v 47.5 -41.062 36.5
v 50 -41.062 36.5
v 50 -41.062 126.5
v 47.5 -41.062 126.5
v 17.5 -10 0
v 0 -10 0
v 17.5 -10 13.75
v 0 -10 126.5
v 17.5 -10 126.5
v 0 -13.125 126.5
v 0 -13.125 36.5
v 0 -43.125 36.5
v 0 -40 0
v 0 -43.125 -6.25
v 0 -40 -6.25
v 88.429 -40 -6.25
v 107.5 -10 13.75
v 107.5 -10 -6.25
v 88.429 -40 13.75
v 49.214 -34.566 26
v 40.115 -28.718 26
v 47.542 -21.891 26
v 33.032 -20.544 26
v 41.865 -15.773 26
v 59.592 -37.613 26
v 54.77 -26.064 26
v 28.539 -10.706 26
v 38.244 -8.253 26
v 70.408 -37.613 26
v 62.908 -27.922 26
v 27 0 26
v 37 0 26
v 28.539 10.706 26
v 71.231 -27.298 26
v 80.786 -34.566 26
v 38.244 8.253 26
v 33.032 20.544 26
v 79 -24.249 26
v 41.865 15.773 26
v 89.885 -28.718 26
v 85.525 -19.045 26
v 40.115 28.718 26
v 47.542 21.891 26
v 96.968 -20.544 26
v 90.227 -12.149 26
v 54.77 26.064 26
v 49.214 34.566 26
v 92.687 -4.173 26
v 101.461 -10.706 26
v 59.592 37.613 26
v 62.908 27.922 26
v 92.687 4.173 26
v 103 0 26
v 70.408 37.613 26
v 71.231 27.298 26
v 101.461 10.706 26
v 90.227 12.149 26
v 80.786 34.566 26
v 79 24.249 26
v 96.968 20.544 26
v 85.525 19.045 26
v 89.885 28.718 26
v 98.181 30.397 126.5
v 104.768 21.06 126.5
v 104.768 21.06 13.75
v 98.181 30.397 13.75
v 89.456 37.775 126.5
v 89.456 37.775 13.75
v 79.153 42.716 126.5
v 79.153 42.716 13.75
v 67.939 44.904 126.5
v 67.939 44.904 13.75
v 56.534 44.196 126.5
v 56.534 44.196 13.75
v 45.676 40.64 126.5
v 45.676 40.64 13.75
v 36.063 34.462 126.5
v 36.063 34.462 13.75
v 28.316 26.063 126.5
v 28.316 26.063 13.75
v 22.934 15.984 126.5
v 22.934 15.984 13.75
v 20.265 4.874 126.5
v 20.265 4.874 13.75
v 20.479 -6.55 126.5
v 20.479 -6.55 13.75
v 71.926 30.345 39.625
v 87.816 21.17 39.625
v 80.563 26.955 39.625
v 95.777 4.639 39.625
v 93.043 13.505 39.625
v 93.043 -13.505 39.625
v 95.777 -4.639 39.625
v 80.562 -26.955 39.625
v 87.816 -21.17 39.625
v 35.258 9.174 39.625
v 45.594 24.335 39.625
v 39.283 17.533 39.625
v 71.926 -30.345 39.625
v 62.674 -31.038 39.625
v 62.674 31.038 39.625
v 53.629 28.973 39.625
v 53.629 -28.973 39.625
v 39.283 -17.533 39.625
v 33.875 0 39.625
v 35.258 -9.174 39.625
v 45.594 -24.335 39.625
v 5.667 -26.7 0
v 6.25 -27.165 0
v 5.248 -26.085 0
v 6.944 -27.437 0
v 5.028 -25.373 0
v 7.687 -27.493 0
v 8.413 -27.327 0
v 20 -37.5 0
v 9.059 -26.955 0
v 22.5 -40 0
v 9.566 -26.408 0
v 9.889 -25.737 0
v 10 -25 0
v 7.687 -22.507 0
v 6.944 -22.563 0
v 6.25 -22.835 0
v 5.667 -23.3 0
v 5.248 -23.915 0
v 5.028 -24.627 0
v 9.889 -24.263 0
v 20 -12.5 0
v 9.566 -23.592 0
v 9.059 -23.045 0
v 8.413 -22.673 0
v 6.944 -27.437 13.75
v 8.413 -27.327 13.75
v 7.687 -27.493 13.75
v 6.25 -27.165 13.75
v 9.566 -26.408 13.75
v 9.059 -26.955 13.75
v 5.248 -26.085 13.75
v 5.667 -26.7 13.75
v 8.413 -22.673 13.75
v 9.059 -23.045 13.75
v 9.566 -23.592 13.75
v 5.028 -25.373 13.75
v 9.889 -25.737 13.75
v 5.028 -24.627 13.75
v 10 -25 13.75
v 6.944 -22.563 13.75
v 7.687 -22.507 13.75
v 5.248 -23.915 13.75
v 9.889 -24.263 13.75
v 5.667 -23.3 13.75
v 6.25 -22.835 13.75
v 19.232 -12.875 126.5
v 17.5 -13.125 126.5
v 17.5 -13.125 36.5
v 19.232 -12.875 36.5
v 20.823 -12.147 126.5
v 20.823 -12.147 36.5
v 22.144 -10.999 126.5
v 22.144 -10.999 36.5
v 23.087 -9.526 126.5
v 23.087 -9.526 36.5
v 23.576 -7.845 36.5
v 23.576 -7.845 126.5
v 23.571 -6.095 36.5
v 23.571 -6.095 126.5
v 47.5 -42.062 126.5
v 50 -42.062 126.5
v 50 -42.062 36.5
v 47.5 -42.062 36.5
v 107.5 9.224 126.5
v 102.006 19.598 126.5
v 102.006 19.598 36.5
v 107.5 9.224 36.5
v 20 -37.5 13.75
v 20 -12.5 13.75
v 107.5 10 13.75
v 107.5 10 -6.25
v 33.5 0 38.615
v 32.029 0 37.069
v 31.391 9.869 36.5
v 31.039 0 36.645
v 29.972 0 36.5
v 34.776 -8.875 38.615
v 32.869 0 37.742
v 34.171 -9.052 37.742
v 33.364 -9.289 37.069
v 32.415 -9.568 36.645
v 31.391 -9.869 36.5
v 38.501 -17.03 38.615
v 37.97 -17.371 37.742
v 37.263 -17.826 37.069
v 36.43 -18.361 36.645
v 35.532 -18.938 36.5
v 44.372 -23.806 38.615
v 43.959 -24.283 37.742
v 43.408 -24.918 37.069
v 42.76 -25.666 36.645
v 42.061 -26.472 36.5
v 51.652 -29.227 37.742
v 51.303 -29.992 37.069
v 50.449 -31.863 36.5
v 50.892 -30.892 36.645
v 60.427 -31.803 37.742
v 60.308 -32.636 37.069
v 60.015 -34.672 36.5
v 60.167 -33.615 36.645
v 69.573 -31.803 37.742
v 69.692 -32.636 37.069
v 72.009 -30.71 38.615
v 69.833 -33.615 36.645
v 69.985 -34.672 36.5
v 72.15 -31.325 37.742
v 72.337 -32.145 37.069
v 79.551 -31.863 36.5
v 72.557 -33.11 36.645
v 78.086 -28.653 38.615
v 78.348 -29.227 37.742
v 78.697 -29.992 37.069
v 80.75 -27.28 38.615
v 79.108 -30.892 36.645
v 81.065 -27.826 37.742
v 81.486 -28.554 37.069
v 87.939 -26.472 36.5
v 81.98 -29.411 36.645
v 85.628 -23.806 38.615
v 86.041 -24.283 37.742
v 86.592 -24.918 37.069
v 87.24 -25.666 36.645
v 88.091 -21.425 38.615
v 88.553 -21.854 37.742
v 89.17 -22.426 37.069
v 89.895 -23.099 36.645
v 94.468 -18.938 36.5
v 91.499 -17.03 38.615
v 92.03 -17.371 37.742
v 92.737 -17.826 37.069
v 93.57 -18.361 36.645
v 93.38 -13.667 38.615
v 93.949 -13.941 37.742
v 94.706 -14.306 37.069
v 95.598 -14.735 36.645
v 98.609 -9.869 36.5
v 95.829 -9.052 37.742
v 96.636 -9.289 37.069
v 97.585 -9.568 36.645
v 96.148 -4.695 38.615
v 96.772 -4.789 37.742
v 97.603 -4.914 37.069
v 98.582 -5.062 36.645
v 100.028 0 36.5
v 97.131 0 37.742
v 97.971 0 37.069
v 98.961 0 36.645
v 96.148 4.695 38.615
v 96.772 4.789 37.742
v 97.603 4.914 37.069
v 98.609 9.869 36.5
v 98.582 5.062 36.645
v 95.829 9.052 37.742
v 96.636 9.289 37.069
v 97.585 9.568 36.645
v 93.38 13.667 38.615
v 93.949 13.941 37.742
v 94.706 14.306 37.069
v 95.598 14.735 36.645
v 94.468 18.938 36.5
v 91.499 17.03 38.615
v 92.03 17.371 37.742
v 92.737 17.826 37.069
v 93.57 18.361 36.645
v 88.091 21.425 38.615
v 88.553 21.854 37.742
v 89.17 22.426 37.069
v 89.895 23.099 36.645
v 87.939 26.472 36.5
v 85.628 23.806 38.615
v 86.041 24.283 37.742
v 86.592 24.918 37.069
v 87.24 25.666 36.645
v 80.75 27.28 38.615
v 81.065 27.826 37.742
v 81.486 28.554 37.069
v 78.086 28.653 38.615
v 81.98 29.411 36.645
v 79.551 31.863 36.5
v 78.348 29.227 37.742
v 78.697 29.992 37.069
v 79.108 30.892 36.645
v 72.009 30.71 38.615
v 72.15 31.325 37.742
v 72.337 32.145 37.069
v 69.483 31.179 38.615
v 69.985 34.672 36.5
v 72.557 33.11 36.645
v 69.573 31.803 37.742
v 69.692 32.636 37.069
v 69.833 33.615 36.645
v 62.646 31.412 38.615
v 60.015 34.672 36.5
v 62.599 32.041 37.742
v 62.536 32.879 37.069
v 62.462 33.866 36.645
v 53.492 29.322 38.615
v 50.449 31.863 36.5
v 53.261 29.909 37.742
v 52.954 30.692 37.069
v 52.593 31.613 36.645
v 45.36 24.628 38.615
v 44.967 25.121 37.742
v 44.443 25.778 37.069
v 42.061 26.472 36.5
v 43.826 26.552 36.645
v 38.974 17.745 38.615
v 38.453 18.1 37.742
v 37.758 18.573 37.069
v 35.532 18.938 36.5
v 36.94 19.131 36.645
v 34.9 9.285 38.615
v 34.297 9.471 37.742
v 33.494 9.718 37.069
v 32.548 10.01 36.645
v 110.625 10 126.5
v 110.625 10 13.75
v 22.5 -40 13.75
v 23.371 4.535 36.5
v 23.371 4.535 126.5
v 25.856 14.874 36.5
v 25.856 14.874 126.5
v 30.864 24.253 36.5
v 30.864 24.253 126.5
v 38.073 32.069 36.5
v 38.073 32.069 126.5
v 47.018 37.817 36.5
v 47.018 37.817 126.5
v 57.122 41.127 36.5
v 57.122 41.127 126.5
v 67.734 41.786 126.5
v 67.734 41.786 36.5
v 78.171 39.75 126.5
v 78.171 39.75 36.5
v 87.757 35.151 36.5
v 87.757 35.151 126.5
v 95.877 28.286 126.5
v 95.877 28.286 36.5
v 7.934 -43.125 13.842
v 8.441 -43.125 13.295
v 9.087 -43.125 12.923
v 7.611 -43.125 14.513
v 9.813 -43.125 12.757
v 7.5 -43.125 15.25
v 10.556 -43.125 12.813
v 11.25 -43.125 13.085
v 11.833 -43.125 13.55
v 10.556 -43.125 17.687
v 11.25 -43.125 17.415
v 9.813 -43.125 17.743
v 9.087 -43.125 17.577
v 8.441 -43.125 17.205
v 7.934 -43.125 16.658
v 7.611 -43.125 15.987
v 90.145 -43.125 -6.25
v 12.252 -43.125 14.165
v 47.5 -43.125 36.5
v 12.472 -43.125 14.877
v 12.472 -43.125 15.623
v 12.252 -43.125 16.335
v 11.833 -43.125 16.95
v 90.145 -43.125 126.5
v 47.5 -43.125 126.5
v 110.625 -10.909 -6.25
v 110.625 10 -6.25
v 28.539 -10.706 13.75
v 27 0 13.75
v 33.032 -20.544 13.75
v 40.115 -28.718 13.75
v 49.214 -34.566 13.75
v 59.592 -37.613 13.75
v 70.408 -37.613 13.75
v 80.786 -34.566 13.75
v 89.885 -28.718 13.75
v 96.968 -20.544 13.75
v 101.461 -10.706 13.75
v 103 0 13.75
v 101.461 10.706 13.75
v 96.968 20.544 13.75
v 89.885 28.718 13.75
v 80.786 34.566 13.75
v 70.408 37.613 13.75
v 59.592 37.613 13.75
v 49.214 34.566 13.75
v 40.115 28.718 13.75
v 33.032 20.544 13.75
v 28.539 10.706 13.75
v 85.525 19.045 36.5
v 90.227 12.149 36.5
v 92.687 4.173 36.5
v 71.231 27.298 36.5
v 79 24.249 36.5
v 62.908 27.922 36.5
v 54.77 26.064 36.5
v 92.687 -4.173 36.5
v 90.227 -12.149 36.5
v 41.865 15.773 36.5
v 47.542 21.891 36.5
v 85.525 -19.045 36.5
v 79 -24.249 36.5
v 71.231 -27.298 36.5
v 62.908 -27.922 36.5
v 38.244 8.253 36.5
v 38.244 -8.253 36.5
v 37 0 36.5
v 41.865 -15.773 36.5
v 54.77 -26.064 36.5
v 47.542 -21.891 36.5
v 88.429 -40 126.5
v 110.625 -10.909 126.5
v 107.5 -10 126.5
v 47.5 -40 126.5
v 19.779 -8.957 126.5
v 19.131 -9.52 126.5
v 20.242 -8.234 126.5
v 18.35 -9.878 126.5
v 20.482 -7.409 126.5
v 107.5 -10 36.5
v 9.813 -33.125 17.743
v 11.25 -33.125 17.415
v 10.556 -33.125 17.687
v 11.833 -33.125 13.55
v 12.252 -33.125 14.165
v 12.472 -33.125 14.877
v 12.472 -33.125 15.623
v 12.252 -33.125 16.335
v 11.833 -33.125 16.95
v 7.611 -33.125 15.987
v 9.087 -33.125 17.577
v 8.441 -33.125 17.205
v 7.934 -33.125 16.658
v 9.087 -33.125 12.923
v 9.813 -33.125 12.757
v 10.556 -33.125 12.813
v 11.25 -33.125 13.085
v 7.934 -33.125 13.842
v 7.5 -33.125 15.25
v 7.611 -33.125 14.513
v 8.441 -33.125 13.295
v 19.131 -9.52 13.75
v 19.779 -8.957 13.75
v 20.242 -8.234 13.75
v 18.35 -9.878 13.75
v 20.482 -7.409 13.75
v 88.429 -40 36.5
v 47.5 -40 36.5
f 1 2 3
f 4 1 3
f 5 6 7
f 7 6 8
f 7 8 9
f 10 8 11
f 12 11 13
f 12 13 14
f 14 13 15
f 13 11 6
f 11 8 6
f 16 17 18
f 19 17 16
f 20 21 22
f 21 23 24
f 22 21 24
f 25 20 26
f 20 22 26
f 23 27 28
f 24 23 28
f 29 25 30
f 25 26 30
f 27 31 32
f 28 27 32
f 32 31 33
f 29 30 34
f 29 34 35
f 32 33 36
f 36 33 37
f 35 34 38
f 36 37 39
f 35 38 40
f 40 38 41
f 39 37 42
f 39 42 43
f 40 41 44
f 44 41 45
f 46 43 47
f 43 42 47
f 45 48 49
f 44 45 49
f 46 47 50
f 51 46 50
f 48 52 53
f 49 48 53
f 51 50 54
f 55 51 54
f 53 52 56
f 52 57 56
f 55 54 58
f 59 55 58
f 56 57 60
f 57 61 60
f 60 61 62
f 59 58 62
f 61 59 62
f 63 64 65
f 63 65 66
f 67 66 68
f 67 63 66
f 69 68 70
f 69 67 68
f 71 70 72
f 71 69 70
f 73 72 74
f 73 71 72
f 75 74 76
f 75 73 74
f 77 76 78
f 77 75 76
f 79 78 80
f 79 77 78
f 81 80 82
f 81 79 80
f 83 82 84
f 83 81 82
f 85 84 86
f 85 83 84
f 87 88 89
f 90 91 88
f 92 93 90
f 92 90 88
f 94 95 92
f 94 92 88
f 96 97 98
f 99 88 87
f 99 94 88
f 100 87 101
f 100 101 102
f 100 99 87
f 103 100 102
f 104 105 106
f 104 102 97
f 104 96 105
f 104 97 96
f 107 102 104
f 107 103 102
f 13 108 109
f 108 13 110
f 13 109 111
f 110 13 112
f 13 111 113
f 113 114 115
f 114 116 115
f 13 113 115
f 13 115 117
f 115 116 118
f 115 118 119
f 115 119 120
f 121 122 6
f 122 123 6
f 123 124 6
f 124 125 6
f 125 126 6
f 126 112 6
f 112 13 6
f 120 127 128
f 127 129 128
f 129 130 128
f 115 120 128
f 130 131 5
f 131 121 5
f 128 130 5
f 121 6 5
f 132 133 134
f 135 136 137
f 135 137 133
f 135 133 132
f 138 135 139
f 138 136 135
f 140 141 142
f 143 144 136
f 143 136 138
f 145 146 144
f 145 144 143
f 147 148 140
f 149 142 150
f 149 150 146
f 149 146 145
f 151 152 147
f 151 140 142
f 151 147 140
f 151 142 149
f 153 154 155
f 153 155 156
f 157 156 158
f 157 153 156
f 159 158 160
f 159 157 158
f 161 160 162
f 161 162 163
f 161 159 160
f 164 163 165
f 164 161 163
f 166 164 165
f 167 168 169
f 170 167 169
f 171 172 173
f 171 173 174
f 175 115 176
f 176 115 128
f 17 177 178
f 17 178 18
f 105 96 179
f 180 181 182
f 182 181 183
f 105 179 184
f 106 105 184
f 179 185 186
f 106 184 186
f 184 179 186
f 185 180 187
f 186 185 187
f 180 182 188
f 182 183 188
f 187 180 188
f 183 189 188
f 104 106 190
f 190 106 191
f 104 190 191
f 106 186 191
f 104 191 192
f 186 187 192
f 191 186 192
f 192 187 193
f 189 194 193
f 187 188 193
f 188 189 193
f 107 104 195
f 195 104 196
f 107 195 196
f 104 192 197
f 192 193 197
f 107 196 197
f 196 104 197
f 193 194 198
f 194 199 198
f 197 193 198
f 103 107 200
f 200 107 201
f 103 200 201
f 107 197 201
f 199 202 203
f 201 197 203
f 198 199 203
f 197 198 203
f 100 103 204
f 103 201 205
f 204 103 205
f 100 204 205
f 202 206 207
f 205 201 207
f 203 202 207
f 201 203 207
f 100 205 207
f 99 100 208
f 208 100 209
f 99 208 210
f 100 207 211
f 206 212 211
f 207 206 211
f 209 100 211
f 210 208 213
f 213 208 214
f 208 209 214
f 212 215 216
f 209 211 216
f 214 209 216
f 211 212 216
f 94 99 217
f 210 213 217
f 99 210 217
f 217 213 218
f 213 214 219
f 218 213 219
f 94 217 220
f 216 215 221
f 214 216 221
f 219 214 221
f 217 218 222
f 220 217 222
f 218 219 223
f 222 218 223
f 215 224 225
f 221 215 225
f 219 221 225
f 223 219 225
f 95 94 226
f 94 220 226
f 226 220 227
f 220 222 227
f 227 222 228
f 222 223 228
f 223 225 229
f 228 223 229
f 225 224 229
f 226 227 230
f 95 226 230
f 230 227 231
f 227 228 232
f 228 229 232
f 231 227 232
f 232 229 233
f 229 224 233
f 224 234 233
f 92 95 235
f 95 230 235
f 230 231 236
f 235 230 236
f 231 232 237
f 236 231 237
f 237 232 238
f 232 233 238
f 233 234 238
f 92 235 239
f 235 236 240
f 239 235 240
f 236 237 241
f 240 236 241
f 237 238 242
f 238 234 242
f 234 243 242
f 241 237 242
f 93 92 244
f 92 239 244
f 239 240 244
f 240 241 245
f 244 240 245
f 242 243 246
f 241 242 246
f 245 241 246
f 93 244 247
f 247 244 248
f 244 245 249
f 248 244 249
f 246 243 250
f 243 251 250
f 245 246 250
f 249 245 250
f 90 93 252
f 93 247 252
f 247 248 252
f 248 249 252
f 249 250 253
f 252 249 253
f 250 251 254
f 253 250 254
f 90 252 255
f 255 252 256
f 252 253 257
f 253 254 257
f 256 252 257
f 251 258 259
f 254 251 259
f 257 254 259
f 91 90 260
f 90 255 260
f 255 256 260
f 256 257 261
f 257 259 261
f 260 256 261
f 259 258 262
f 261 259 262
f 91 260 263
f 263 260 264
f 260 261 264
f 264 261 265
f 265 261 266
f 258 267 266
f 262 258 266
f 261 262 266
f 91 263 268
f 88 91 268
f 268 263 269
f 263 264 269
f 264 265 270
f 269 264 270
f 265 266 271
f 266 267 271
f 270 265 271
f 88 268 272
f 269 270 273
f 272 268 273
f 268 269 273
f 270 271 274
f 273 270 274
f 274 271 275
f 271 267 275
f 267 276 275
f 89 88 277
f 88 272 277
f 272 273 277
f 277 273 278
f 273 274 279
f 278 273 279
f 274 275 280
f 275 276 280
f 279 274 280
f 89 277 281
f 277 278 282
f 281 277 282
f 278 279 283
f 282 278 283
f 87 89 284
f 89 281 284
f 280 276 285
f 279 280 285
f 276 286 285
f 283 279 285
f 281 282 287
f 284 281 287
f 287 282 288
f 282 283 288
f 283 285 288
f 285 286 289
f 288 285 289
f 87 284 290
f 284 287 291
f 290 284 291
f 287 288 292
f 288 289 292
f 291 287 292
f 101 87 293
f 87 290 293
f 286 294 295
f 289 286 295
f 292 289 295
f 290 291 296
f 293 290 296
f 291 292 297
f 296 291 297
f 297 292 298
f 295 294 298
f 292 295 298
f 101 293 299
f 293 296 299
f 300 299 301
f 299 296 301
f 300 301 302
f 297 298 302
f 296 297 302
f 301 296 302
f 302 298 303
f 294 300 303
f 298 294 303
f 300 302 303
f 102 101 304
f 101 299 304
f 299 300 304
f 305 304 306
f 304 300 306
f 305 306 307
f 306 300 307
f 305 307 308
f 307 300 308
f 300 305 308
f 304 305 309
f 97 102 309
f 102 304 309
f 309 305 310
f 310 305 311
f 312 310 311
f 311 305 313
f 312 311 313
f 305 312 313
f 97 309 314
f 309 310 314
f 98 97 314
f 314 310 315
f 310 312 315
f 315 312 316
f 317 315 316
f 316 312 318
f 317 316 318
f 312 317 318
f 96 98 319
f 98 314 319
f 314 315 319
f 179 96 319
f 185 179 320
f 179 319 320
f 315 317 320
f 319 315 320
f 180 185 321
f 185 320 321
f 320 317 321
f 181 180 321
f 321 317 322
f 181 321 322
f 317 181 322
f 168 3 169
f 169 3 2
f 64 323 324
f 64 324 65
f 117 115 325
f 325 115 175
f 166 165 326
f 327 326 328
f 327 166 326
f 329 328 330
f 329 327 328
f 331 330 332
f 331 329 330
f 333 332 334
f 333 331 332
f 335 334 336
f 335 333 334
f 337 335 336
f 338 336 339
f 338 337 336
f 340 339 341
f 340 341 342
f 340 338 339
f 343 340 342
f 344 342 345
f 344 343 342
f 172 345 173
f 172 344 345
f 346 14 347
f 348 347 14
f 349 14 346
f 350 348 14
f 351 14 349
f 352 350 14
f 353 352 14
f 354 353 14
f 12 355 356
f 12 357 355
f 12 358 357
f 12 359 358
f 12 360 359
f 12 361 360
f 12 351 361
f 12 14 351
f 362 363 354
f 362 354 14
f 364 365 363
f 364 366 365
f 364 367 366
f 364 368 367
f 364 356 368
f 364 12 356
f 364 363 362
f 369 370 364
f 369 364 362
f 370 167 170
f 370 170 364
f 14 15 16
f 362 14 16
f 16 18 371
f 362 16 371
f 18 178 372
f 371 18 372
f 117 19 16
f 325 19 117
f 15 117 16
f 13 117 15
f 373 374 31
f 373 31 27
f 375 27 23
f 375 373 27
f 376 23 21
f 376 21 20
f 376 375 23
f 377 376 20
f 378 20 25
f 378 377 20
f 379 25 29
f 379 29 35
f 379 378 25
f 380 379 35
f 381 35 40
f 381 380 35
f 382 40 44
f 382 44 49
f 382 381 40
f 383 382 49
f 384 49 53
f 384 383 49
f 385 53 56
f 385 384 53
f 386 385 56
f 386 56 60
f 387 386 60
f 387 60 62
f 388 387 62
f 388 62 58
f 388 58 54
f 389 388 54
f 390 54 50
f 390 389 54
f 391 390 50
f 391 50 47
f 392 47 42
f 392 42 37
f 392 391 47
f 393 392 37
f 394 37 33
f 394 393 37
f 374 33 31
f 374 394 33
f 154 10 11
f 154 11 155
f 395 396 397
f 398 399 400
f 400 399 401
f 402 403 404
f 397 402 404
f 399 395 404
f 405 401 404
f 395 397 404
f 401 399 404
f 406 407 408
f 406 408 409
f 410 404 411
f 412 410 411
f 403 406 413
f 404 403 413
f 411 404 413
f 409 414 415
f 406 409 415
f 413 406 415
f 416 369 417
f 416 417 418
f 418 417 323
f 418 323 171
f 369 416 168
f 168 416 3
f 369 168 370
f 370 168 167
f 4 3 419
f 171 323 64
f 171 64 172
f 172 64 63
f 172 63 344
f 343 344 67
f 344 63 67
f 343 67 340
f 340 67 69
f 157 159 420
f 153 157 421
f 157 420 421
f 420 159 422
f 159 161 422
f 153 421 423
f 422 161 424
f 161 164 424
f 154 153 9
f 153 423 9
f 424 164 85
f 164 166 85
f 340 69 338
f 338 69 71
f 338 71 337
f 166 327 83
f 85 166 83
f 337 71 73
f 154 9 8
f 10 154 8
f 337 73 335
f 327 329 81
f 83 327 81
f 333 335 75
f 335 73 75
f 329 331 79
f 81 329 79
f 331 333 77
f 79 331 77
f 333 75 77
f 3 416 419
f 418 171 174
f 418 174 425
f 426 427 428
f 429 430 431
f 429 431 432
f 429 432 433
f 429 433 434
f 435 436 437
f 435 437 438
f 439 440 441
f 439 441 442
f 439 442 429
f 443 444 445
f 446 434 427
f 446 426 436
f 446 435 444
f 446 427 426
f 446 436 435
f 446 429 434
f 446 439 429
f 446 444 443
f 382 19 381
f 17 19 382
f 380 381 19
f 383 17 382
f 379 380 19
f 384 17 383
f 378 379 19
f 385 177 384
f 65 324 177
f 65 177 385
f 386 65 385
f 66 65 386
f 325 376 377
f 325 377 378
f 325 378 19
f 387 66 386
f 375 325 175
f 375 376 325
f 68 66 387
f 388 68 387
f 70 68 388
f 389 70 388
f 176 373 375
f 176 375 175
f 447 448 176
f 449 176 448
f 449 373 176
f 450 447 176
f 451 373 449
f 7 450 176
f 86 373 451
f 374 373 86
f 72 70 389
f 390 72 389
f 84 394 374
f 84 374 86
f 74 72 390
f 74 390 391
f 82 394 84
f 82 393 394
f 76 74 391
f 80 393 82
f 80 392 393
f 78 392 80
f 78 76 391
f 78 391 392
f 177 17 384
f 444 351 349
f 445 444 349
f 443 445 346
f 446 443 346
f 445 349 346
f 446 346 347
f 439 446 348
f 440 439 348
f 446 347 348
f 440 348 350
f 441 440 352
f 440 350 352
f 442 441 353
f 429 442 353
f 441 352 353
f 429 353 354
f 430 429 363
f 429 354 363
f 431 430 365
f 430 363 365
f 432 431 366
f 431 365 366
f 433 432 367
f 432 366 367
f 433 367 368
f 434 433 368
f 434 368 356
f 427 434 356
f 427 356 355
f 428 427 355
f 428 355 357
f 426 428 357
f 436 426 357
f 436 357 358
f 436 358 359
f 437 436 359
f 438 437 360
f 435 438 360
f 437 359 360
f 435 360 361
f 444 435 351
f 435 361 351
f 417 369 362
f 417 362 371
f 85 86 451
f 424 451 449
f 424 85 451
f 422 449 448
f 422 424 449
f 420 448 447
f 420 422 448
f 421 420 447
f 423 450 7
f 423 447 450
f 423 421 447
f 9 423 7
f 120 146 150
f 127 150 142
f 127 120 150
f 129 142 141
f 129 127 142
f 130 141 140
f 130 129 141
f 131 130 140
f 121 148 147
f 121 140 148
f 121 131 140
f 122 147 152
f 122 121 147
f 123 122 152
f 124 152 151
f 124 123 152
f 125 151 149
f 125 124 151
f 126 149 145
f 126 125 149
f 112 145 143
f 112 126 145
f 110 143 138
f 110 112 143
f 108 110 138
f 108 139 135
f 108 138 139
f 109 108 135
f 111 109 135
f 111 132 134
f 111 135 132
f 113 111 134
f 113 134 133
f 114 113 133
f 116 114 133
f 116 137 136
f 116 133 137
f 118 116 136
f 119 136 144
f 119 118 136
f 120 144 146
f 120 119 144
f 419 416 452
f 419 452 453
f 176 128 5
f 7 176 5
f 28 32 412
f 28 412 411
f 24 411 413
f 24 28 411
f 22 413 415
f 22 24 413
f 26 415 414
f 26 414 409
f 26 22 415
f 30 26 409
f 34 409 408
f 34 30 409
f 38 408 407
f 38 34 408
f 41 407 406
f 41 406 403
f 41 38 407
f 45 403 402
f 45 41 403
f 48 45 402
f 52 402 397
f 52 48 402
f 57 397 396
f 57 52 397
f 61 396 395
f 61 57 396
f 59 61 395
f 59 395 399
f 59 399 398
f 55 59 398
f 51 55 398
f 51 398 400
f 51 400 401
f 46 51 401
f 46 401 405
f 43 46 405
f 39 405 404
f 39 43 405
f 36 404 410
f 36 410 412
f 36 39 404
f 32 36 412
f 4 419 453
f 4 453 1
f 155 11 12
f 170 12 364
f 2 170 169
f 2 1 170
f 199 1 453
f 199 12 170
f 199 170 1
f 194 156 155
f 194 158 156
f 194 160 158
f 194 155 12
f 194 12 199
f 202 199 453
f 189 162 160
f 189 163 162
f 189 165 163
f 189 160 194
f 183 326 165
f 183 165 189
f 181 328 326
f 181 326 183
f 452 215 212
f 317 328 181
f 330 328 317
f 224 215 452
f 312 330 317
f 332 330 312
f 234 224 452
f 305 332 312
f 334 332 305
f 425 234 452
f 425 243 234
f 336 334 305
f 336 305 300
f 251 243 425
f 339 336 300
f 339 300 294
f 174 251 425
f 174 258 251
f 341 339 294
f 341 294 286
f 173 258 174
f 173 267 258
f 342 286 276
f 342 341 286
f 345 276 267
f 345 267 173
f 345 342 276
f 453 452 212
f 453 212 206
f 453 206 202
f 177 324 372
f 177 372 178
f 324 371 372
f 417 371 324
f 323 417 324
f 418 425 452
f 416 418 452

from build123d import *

# Parameters (mm, degrees)
SKETCH3_W                = 40
SKETCH3_H                = 30
SKETCH3_R                = 2.5
BOSS_EXTRUDE2_DEPTH      = 6.25
SKETCH4_W                = 40
SKETCH4_H                = 6.25
BOSS_EXTRUDE3_DEPTH      = 7.5
BOSS_EXTRUDE4_DEPTH      = 20
CHAMFER1_SIZE            = 2.5
SKETCH6_R                = 38
BOSS_EXTRUDE5_DEPTH      = 12.25
SKETCH8_R                = 28
BOSS_EXTRUDE7_DEPTH      = 10.5
SKETCH9_R                = 31.125
BOSS_EXTRUDE8_DEPTH      = 3.125
FILLET1_R                = 4
BOSS_EXTRUDE9_DEPTH      = 90
CHAMFER1_OF_MIRROR1_SIZE = 2.5
FILLET1_OF_MIRROR1_R     = 4
SKETCH12_R               = 2.5
BOSS_EXTRUDE10_DEPTH     = 30
SKETCH14_R               = 2.5
CUT_EXTRUDE1_DEPTH       = 10
CUT_EXTRUDE2_DEPTH       = 50
SKETCH17_W               = 1
SKETCH17_H               = 6.235194638
BOSS_EXTRUDE11_DEPTH     = 5
FILLET2_R                = 0.5
FILLET3_R                = 0.5
SKETCH18_W               = 524.380672346
SKETCH18_H               = 94.959875778
CUT_EXTRUDE3_DEPTH       = 174
SKETCH19_W               = 272.949766815
SKETCH19_H               = 179.225609408
CUT_EXTRUDE4_DEPTH       = 174


with BuildPart() as part:
    # Sketch3 → Boss-Extrude2 (new body)
    with BuildSketch(Plane.XY):
        with Locations((0, -25)):
            Rectangle(SKETCH3_W, SKETCH3_H)
        with Locations((7.5, -25)):
            Circle(SKETCH3_R, mode=Mode.SUBTRACT)
        with Locations((-7.5, -25)):
            Circle(SKETCH3_R, mode=Mode.SUBTRACT)
    boss_extrude2 = extrude(amount=BOSS_EXTRUDE2_DEPTH)

    # Sketch4 → Boss-Extrude3 (add)
    with BuildSketch(Plane.XY.offset(6.25)):
        with Locations((0, -36.875)):
            Rectangle(SKETCH4_W, SKETCH4_H)
    boss_extrude3 = extrude(amount=BOSS_EXTRUDE3_DEPTH)

    # Sketch5 → Boss-Extrude4 (add)
    with BuildSketch(Plane.XY.offset(13.75)):
        Polygon((-20, -40), (-88.428700673, -40), (-107.5, -10), (-107.5, 10), (-110.625, 10), (-110.625, -10.909213368), (-90.145103003, -43.125), (90.145103003, -43.125), (110.625, -10.909213368), (110.625, 10), (107.5, 10), (107.5, -10), (88.428700673, -40), (20, -40), align=None)
    boss_extrude4 = extrude(amount=-BOSS_EXTRUDE4_DEPTH)

    # Chamfer1
    chamfer1_edges = [part.edges().sort_by_distance(p)[0] for p in [
        (-20, -40, 6.875),
        (-20, -10, 3.125),
        (20, -10, 3.125),
        (20, -40, 6.875),
    ]]
    chamfer(chamfer1_edges, length=CHAMFER1_SIZE)

    # Sketch6 → Boss-Extrude5 (add)
    with BuildSketch(Plane.XY.offset(13.75)):
        with BuildLine():
            Line((-110.625, 10), (-104.767593775, 21.060353399))
            ThreePointArc((-104.767593775, 21.060353399), (-50.991609061, 42.764061819), (-20.479289941, -6.550295858))
            ThreePointArc((-20.479289941, -6.550295858), (-19.779069285, -8.956923473), (-17.5, -10))
            Line((-17.5, -10), (17.5, -10))
            ThreePointArc((17.5, -10), (19.779069285, -8.956923473), (20.479289941, -6.550295858))
            ThreePointArc((20.479289941, -6.550295858), (50.991609061, 42.764061819), (104.767593775, 21.060353399))
            Line((104.767593775, 21.060353399), (110.625, 10))
            Line((110.625, 10), (110.625, -10.909213368))
            Line((110.625, -10.909213368), (90.145103003, -43.125))
            Line((90.145103003, -43.125), (-90.145103003, -43.125))
            Line((-90.145103003, -43.125), (-110.625, -10.909213368))
            Line((-110.625, -10.909213368), (-110.625, 10))
        make_face()
        with Locations((-65, 0)):
            Circle(SKETCH6_R, mode=Mode.SUBTRACT)
        with Locations(Location((65, 0, 0), (0, 0, 180))):
            Circle(SKETCH6_R, mode=Mode.SUBTRACT)
    boss_extrude5 = extrude(amount=BOSS_EXTRUDE5_DEPTH)

    # Sketch8 → Boss-Extrude7 (add)
    with BuildSketch(Plane.XY.offset(26)):
        with BuildLine():
            Line((-104.767593775, 21.060353399), (-110.625, 10))
            Line((-110.625, 10), (-110.625, -10.909213368))
            Line((-110.625, -10.909213368), (-90.145103003, -43.125))
            Line((-90.145103003, -43.125), (90.145103003, -43.125))
            Line((90.145103003, -43.125), (110.625, -10.909213368))
            Line((110.625, -10.909213368), (110.625, 10))
            Line((110.625, 10), (104.767593775, 21.060353399))
            ThreePointArc((104.767593775, 21.060353399), (50.991609061, 42.764061819), (20.479289941, -6.550295858))
            ThreePointArc((20.479289941, -6.550295858), (19.779069285, -8.956923473), (17.5, -10))
            Line((17.5, -10), (-17.5, -10))
            ThreePointArc((-17.5, -10), (-19.779069285, -8.956923473), (-20.479289941, -6.550295858))
            ThreePointArc((-20.479289941, -6.550295858), (-50.991609061, 42.764061819), (-104.767593775, 21.060353399))
        make_face()
        with Locations(Location((-65, 0, 0), (0, 0, 180))):
            Circle(SKETCH8_R, mode=Mode.SUBTRACT)
        with Locations(Location((65, 0, 0), (0, 0, 180))):
            Circle(SKETCH8_R, mode=Mode.SUBTRACT)
    boss_extrude7 = extrude(amount=BOSS_EXTRUDE7_DEPTH)

    # Sketch9 → Boss-Extrude8 (add)
    with BuildSketch(Plane.XY.offset(36.5)):
        with Locations(Location((65, 0, 0), (0, 0, 180))):
            Circle(SKETCH9_R)
        with Locations((-65, 0)):
            Circle(SKETCH9_R)
    boss_extrude8 = extrude(amount=BOSS_EXTRUDE8_DEPTH)

    # Fillet1
    # the kernel refuses this fillet: 4 mm, written as the material it adds along each edge
    with BuildSketch(Plane(origin=(-65, 0, 36.5), x_dir=(1, 0, 0), z_dir=(0, -1, 0))) as fillet1_piece_1:
        with BuildLine():
            CenterArc((35.028123749, 4), FILLET1_R, 192.635625093, 77.364374907)
            Line((31.125, 3.125), (31.046937525, 3.1075))
            ThreePointArc((31.046937525, 3.1075), (31.045, 1.5625), (31.045, 0))
            Line((31.045, 0), (31.125, -0.08))
            Line((31.125, -0.08), (35.028123749, -0.08))
            Line((35.028123749, -0.08), (35.028123749, 0))
        make_face()
    revolve(axis=Axis((-65, 0, 36.5), (0, 0, 1)))
    with BuildSketch(Plane(origin=(65, 0, 36.5), x_dir=(-1, 0, 0), z_dir=(0, 1, 0))) as fillet1_piece_2:
        with BuildLine():
            CenterArc((35.028123749, 4), FILLET1_R, 192.635625093, 77.364374907)
            Line((31.125, 3.125), (31.046937525, 3.1075))
            ThreePointArc((31.046937525, 3.1075), (31.045, 1.5625), (31.045, 0))
            Line((31.045, 0), (31.125, -0.08))
            Line((31.125, -0.08), (35.028123749, -0.08))
            Line((35.028123749, -0.08), (35.028123749, 0))
        make_face()
    revolve(axis=Axis((65, 0, 36.5), (0, 0, 1)))

    # Sketch10 → Boss-Extrude9 (add)
    with BuildSketch(Plane.XY.offset(36.5)):
        with BuildLine():
            Line((-104.767593775, 21.060353399), (-110.625, 10))
            Line((-110.625, 10), (-110.625, -10.909213368))
            Line((-110.625, -10.909213368), (-90.145103003, -43.125))
            Line((-90.145103003, -43.125), (-47.5, -43.125))
            Line((-47.5, -43.125), (-47.5, -40))
            Line((-47.5, -40), (-88.428700673, -40))
            Line((-88.428700673, -40), (-107.5, -10))
            Line((-107.5, -10), (-107.5, 9.223599474))
            Line((-107.5, 9.223599474), (-102.005955319, 19.597828858))
            ThreePointArc((-102.005955319, 19.597828858), (-51.964413987, 39.794335304), (-23.571005917, -6.095414201))
            ThreePointArc((-23.571005917, -6.095414201), (-22.144141184, -10.999485568), (-17.5, -13.125))
            Line((-17.5, -13.125), (17.5, -13.125))
            ThreePointArc((17.5, -13.125), (22.144141184, -10.999485568), (23.571005917, -6.095414201))
            ThreePointArc((23.571005917, -6.095414201), (51.964413987, 39.794335304), (102.005955319, 19.597828858))
            Line((102.005955319, 19.597828858), (107.5, 9.223599474))
            Line((107.5, 9.223599474), (107.5, -10))
            Line((107.5, -10), (88.428700673, -40))
            Line((88.428700673, -40), (47.5, -40))
            Line((47.5, -40), (47.5, -43.125))
            Line((47.5, -43.125), (90.145103003, -43.125))
            Line((90.145103003, -43.125), (110.625, -10.909213368))
            Line((110.625, -10.909213368), (110.625, 10))
            Line((110.625, 10), (104.767593775, 21.060353399))
            ThreePointArc((104.767593775, 21.060353399), (50.991609061, 42.764061819), (20.479289941, -6.550295858))
            ThreePointArc((20.479289941, -6.550295858), (19.779069285, -8.956923473), (17.5, -10))
            Line((17.5, -10), (-17.5, -10))
            ThreePointArc((-17.5, -10), (-19.779069285, -8.956923473), (-20.479289941, -6.550295858))
            ThreePointArc((-20.479289941, -6.550295858), (-50.991609061, 42.764061819), (-104.767593775, 21.060353399))
        make_face()
    boss_extrude9 = extrude(amount=BOSS_EXTRUDE9_DEPTH)

    # Mirror1: Boss-Extrude2, Boss-Extrude3, Boss-Extrude4, Boss-Extrude5, Boss-Extrude7, Boss-Extrude8, Boss-Extrude9 across plane
    add(boss_extrude2.mirror(Plane(origin=(-65, 0, 126.5), x_dir=(1, 0, 0), z_dir=(0, 0, 1))))
    add(boss_extrude3.mirror(Plane(origin=(-65, 0, 126.5), x_dir=(1, 0, 0), z_dir=(0, 0, 1))))
    add(boss_extrude4.mirror(Plane(origin=(-65, 0, 126.5), x_dir=(1, 0, 0), z_dir=(0, 0, 1))))
    add(boss_extrude5.mirror(Plane(origin=(-65, 0, 126.5), x_dir=(1, 0, 0), z_dir=(0, 0, 1))))
    add(boss_extrude7.mirror(Plane(origin=(-65, 0, 126.5), x_dir=(1, 0, 0), z_dir=(0, 0, 1))))
    add(boss_extrude8.mirror(Plane(origin=(-65, 0, 126.5), x_dir=(1, 0, 0), z_dir=(0, 0, 1))))
    add(boss_extrude9.mirror(Plane(origin=(-65, 0, 126.5), x_dir=(1, 0, 0), z_dir=(0, 0, 1))))

    # Chamfer1 of Mirror1
    chamfer1_of_mirror1_edges = [part.edges().sort_by_distance(p)[0] for p in [
        (-20, -40, 246.125),
        (-20, -10, 249.875),
        (20, -10, 249.875),
        (20, -40, 246.125),
    ]]
    chamfer(chamfer1_of_mirror1_edges, length=CHAMFER1_OF_MIRROR1_SIZE)

    # Fillet1 of Mirror1
    # the kernel refuses this fillet: 4 mm, written as the material it adds along each edge
    with BuildSketch(Plane(origin=(-65, 0, 216.5), x_dir=(1, 0, 0), z_dir=(0, -1, 0))) as fillet1_of_mirror1_piece_1:
        with BuildLine():
            CenterArc((35.028123749, -4), FILLET1_OF_MIRROR1_R, 90, 77.364374907)
            Line((31.125, -3.125), (31.046937525, -3.1075))
            ThreePointArc((31.046937525, -3.1075), (31.045, -1.5625), (31.045, 0))
            Line((31.045, 0), (31.125, 0.08))
            Line((31.125, 0.08), (35.028123749, 0.08))
            Line((35.028123749, 0.08), (35.028123749, 0))
        make_face()
    revolve(axis=Axis((-65, 0, 216.5), (0, 0, 1)))
    with BuildSketch(Plane(origin=(65, 0, 216.5), x_dir=(-1, 0, 0), z_dir=(0, 1, 0))) as fillet1_of_mirror1_piece_2:
        with BuildLine():
            CenterArc((35.028123749, -4), FILLET1_OF_MIRROR1_R, 90, 77.364374907)
            Line((31.125, -3.125), (31.046937525, -3.1075))
            ThreePointArc((31.046937525, -3.1075), (31.045, -1.5625), (31.045, 0))
            Line((31.045, 0), (31.125, 0.08))
            Line((31.125, 0.08), (35.028123749, 0.08))
            Line((35.028123749, 0.08), (35.028123749, 0))
        make_face()
    revolve(axis=Axis((65, 0, 216.5), (0, 0, 1)))

    # Sketch12 → Boss-Extrude10 (add)
    with BuildSketch(Plane.XY.offset(253)):
        Polygon((-20, -12.5), (-20, -37.5), (-22.5, -40), (22.5, -40), (20, -37.5), (20, -12.5), (17.5, -10), (-17.5, -10), align=None)
        with Locations((7.5, -25)):
            Circle(SKETCH12_R, mode=Mode.SUBTRACT)
        with Locations((-7.5, -25)):
            Circle(SKETCH12_R, mode=Mode.SUBTRACT)
    boss_extrude10 = extrude(amount=-BOSS_EXTRUDE10_DEPTH)

    # Mirror2: Boss-Extrude10 across plane
    add(boss_extrude10.mirror(Plane(origin=(0, 0, 126.5), x_dir=(1, 0, 0), z_dir=(0, 0, -1))))

    # Sketch14 → Cut-Extrude1 (cut)
    with BuildSketch(Plane.XZ.offset(43.125)):
        with Locations((10, 237.75)):
            Circle(SKETCH14_R)
        with Locations(Location((-10, 237.75, 0), (0, 0, 180))):
            Circle(SKETCH14_R)
        with Locations((-10, 15.25)):
            Circle(SKETCH14_R)
        with Locations(Location((10, 15.25, 0), (0, 0, 180))):
            Circle(SKETCH14_R)
    extrude(amount=-CUT_EXTRUDE1_DEPTH, mode=Mode.SUBTRACT)

    # Sketch16 → Cut-Extrude2 (cut, symmetric)
    with BuildSketch(Plane(origin=(0, 0, 0), x_dir=(0, 0, -1), z_dir=(1, 0, 0))):
        Polygon((-215.5, -41.0625), (-215.5, -40), (-216.5, -40), (-216.5, -41.0625), (-216.5, -42.0625), (-36.5, -42.0625), (-36.5, -41.0625), align=None)
    cut_extrude2 = extrude(amount=CUT_EXTRUDE2_DEPTH, both=True, mode=Mode.SUBTRACT)

    # Sketch17 → Boss-Extrude11 (add)
    with BuildSketch(Plane(origin=(-47.5, 0, 0), x_dir=(0, 0, -1), z_dir=(1, 0, 0))):
        with Locations((-215, -37.944902681)):
            Rectangle(SKETCH17_W, SKETCH17_H)
    boss_extrude11 = extrude(amount=-BOSS_EXTRUDE11_DEPTH)

    # Fillet2
    fillet2_edges = [part.edges().sort_by_distance(p)[0] for p in [
        (-48.75, -41.0625, 215.5),
        (-50, -40, 214.5),
    ]]
    fillet(fillet2_edges, radius=FILLET2_R)

    # Mirror3: Cut-Extrude2, Boss-Extrude11 across plane
    add(cut_extrude2.mirror(Plane(origin=(0, 0, 0), x_dir=(0, 0, 1), z_dir=(1, 0, 0))), mode=Mode.SUBTRACT)
    add(boss_extrude11.mirror(Plane(origin=(0, 0, 0), x_dir=(0, 0, 1), z_dir=(1, 0, 0))))

    # Fillet3
    fillet3_edges = [part.edges().sort_by_distance(p)[0] for p in [
        (48.75, -41.0625, 215.5),
        (50, -40, 214.5),
    ]]
    fillet(fillet3_edges, radius=FILLET3_R)

    # Sketch18 → Cut-Extrude3 (cut)
    with BuildSketch(Plane(origin=(0, 0, 126.5), x_dir=(-1, 0, 0), z_dir=(0, 0, -1))):
        Rectangle(SKETCH18_W, SKETCH18_H)
    extrude(amount=-CUT_EXTRUDE3_DEPTH, mode=Mode.SUBTRACT)

    # Sketch19 → Cut-Extrude4 (cut)
    with BuildSketch(Plane(origin=(0, 0, 0), x_dir=(0, 0, -1), z_dir=(1, 0, 0))):
        with Locations((-54.462141768, 10)):
            Rectangle(SKETCH19_W, SKETCH19_H)
    extrude(amount=-CUT_EXTRUDE4_DEPTH, mode=Mode.SUBTRACT)


solid = part.part
